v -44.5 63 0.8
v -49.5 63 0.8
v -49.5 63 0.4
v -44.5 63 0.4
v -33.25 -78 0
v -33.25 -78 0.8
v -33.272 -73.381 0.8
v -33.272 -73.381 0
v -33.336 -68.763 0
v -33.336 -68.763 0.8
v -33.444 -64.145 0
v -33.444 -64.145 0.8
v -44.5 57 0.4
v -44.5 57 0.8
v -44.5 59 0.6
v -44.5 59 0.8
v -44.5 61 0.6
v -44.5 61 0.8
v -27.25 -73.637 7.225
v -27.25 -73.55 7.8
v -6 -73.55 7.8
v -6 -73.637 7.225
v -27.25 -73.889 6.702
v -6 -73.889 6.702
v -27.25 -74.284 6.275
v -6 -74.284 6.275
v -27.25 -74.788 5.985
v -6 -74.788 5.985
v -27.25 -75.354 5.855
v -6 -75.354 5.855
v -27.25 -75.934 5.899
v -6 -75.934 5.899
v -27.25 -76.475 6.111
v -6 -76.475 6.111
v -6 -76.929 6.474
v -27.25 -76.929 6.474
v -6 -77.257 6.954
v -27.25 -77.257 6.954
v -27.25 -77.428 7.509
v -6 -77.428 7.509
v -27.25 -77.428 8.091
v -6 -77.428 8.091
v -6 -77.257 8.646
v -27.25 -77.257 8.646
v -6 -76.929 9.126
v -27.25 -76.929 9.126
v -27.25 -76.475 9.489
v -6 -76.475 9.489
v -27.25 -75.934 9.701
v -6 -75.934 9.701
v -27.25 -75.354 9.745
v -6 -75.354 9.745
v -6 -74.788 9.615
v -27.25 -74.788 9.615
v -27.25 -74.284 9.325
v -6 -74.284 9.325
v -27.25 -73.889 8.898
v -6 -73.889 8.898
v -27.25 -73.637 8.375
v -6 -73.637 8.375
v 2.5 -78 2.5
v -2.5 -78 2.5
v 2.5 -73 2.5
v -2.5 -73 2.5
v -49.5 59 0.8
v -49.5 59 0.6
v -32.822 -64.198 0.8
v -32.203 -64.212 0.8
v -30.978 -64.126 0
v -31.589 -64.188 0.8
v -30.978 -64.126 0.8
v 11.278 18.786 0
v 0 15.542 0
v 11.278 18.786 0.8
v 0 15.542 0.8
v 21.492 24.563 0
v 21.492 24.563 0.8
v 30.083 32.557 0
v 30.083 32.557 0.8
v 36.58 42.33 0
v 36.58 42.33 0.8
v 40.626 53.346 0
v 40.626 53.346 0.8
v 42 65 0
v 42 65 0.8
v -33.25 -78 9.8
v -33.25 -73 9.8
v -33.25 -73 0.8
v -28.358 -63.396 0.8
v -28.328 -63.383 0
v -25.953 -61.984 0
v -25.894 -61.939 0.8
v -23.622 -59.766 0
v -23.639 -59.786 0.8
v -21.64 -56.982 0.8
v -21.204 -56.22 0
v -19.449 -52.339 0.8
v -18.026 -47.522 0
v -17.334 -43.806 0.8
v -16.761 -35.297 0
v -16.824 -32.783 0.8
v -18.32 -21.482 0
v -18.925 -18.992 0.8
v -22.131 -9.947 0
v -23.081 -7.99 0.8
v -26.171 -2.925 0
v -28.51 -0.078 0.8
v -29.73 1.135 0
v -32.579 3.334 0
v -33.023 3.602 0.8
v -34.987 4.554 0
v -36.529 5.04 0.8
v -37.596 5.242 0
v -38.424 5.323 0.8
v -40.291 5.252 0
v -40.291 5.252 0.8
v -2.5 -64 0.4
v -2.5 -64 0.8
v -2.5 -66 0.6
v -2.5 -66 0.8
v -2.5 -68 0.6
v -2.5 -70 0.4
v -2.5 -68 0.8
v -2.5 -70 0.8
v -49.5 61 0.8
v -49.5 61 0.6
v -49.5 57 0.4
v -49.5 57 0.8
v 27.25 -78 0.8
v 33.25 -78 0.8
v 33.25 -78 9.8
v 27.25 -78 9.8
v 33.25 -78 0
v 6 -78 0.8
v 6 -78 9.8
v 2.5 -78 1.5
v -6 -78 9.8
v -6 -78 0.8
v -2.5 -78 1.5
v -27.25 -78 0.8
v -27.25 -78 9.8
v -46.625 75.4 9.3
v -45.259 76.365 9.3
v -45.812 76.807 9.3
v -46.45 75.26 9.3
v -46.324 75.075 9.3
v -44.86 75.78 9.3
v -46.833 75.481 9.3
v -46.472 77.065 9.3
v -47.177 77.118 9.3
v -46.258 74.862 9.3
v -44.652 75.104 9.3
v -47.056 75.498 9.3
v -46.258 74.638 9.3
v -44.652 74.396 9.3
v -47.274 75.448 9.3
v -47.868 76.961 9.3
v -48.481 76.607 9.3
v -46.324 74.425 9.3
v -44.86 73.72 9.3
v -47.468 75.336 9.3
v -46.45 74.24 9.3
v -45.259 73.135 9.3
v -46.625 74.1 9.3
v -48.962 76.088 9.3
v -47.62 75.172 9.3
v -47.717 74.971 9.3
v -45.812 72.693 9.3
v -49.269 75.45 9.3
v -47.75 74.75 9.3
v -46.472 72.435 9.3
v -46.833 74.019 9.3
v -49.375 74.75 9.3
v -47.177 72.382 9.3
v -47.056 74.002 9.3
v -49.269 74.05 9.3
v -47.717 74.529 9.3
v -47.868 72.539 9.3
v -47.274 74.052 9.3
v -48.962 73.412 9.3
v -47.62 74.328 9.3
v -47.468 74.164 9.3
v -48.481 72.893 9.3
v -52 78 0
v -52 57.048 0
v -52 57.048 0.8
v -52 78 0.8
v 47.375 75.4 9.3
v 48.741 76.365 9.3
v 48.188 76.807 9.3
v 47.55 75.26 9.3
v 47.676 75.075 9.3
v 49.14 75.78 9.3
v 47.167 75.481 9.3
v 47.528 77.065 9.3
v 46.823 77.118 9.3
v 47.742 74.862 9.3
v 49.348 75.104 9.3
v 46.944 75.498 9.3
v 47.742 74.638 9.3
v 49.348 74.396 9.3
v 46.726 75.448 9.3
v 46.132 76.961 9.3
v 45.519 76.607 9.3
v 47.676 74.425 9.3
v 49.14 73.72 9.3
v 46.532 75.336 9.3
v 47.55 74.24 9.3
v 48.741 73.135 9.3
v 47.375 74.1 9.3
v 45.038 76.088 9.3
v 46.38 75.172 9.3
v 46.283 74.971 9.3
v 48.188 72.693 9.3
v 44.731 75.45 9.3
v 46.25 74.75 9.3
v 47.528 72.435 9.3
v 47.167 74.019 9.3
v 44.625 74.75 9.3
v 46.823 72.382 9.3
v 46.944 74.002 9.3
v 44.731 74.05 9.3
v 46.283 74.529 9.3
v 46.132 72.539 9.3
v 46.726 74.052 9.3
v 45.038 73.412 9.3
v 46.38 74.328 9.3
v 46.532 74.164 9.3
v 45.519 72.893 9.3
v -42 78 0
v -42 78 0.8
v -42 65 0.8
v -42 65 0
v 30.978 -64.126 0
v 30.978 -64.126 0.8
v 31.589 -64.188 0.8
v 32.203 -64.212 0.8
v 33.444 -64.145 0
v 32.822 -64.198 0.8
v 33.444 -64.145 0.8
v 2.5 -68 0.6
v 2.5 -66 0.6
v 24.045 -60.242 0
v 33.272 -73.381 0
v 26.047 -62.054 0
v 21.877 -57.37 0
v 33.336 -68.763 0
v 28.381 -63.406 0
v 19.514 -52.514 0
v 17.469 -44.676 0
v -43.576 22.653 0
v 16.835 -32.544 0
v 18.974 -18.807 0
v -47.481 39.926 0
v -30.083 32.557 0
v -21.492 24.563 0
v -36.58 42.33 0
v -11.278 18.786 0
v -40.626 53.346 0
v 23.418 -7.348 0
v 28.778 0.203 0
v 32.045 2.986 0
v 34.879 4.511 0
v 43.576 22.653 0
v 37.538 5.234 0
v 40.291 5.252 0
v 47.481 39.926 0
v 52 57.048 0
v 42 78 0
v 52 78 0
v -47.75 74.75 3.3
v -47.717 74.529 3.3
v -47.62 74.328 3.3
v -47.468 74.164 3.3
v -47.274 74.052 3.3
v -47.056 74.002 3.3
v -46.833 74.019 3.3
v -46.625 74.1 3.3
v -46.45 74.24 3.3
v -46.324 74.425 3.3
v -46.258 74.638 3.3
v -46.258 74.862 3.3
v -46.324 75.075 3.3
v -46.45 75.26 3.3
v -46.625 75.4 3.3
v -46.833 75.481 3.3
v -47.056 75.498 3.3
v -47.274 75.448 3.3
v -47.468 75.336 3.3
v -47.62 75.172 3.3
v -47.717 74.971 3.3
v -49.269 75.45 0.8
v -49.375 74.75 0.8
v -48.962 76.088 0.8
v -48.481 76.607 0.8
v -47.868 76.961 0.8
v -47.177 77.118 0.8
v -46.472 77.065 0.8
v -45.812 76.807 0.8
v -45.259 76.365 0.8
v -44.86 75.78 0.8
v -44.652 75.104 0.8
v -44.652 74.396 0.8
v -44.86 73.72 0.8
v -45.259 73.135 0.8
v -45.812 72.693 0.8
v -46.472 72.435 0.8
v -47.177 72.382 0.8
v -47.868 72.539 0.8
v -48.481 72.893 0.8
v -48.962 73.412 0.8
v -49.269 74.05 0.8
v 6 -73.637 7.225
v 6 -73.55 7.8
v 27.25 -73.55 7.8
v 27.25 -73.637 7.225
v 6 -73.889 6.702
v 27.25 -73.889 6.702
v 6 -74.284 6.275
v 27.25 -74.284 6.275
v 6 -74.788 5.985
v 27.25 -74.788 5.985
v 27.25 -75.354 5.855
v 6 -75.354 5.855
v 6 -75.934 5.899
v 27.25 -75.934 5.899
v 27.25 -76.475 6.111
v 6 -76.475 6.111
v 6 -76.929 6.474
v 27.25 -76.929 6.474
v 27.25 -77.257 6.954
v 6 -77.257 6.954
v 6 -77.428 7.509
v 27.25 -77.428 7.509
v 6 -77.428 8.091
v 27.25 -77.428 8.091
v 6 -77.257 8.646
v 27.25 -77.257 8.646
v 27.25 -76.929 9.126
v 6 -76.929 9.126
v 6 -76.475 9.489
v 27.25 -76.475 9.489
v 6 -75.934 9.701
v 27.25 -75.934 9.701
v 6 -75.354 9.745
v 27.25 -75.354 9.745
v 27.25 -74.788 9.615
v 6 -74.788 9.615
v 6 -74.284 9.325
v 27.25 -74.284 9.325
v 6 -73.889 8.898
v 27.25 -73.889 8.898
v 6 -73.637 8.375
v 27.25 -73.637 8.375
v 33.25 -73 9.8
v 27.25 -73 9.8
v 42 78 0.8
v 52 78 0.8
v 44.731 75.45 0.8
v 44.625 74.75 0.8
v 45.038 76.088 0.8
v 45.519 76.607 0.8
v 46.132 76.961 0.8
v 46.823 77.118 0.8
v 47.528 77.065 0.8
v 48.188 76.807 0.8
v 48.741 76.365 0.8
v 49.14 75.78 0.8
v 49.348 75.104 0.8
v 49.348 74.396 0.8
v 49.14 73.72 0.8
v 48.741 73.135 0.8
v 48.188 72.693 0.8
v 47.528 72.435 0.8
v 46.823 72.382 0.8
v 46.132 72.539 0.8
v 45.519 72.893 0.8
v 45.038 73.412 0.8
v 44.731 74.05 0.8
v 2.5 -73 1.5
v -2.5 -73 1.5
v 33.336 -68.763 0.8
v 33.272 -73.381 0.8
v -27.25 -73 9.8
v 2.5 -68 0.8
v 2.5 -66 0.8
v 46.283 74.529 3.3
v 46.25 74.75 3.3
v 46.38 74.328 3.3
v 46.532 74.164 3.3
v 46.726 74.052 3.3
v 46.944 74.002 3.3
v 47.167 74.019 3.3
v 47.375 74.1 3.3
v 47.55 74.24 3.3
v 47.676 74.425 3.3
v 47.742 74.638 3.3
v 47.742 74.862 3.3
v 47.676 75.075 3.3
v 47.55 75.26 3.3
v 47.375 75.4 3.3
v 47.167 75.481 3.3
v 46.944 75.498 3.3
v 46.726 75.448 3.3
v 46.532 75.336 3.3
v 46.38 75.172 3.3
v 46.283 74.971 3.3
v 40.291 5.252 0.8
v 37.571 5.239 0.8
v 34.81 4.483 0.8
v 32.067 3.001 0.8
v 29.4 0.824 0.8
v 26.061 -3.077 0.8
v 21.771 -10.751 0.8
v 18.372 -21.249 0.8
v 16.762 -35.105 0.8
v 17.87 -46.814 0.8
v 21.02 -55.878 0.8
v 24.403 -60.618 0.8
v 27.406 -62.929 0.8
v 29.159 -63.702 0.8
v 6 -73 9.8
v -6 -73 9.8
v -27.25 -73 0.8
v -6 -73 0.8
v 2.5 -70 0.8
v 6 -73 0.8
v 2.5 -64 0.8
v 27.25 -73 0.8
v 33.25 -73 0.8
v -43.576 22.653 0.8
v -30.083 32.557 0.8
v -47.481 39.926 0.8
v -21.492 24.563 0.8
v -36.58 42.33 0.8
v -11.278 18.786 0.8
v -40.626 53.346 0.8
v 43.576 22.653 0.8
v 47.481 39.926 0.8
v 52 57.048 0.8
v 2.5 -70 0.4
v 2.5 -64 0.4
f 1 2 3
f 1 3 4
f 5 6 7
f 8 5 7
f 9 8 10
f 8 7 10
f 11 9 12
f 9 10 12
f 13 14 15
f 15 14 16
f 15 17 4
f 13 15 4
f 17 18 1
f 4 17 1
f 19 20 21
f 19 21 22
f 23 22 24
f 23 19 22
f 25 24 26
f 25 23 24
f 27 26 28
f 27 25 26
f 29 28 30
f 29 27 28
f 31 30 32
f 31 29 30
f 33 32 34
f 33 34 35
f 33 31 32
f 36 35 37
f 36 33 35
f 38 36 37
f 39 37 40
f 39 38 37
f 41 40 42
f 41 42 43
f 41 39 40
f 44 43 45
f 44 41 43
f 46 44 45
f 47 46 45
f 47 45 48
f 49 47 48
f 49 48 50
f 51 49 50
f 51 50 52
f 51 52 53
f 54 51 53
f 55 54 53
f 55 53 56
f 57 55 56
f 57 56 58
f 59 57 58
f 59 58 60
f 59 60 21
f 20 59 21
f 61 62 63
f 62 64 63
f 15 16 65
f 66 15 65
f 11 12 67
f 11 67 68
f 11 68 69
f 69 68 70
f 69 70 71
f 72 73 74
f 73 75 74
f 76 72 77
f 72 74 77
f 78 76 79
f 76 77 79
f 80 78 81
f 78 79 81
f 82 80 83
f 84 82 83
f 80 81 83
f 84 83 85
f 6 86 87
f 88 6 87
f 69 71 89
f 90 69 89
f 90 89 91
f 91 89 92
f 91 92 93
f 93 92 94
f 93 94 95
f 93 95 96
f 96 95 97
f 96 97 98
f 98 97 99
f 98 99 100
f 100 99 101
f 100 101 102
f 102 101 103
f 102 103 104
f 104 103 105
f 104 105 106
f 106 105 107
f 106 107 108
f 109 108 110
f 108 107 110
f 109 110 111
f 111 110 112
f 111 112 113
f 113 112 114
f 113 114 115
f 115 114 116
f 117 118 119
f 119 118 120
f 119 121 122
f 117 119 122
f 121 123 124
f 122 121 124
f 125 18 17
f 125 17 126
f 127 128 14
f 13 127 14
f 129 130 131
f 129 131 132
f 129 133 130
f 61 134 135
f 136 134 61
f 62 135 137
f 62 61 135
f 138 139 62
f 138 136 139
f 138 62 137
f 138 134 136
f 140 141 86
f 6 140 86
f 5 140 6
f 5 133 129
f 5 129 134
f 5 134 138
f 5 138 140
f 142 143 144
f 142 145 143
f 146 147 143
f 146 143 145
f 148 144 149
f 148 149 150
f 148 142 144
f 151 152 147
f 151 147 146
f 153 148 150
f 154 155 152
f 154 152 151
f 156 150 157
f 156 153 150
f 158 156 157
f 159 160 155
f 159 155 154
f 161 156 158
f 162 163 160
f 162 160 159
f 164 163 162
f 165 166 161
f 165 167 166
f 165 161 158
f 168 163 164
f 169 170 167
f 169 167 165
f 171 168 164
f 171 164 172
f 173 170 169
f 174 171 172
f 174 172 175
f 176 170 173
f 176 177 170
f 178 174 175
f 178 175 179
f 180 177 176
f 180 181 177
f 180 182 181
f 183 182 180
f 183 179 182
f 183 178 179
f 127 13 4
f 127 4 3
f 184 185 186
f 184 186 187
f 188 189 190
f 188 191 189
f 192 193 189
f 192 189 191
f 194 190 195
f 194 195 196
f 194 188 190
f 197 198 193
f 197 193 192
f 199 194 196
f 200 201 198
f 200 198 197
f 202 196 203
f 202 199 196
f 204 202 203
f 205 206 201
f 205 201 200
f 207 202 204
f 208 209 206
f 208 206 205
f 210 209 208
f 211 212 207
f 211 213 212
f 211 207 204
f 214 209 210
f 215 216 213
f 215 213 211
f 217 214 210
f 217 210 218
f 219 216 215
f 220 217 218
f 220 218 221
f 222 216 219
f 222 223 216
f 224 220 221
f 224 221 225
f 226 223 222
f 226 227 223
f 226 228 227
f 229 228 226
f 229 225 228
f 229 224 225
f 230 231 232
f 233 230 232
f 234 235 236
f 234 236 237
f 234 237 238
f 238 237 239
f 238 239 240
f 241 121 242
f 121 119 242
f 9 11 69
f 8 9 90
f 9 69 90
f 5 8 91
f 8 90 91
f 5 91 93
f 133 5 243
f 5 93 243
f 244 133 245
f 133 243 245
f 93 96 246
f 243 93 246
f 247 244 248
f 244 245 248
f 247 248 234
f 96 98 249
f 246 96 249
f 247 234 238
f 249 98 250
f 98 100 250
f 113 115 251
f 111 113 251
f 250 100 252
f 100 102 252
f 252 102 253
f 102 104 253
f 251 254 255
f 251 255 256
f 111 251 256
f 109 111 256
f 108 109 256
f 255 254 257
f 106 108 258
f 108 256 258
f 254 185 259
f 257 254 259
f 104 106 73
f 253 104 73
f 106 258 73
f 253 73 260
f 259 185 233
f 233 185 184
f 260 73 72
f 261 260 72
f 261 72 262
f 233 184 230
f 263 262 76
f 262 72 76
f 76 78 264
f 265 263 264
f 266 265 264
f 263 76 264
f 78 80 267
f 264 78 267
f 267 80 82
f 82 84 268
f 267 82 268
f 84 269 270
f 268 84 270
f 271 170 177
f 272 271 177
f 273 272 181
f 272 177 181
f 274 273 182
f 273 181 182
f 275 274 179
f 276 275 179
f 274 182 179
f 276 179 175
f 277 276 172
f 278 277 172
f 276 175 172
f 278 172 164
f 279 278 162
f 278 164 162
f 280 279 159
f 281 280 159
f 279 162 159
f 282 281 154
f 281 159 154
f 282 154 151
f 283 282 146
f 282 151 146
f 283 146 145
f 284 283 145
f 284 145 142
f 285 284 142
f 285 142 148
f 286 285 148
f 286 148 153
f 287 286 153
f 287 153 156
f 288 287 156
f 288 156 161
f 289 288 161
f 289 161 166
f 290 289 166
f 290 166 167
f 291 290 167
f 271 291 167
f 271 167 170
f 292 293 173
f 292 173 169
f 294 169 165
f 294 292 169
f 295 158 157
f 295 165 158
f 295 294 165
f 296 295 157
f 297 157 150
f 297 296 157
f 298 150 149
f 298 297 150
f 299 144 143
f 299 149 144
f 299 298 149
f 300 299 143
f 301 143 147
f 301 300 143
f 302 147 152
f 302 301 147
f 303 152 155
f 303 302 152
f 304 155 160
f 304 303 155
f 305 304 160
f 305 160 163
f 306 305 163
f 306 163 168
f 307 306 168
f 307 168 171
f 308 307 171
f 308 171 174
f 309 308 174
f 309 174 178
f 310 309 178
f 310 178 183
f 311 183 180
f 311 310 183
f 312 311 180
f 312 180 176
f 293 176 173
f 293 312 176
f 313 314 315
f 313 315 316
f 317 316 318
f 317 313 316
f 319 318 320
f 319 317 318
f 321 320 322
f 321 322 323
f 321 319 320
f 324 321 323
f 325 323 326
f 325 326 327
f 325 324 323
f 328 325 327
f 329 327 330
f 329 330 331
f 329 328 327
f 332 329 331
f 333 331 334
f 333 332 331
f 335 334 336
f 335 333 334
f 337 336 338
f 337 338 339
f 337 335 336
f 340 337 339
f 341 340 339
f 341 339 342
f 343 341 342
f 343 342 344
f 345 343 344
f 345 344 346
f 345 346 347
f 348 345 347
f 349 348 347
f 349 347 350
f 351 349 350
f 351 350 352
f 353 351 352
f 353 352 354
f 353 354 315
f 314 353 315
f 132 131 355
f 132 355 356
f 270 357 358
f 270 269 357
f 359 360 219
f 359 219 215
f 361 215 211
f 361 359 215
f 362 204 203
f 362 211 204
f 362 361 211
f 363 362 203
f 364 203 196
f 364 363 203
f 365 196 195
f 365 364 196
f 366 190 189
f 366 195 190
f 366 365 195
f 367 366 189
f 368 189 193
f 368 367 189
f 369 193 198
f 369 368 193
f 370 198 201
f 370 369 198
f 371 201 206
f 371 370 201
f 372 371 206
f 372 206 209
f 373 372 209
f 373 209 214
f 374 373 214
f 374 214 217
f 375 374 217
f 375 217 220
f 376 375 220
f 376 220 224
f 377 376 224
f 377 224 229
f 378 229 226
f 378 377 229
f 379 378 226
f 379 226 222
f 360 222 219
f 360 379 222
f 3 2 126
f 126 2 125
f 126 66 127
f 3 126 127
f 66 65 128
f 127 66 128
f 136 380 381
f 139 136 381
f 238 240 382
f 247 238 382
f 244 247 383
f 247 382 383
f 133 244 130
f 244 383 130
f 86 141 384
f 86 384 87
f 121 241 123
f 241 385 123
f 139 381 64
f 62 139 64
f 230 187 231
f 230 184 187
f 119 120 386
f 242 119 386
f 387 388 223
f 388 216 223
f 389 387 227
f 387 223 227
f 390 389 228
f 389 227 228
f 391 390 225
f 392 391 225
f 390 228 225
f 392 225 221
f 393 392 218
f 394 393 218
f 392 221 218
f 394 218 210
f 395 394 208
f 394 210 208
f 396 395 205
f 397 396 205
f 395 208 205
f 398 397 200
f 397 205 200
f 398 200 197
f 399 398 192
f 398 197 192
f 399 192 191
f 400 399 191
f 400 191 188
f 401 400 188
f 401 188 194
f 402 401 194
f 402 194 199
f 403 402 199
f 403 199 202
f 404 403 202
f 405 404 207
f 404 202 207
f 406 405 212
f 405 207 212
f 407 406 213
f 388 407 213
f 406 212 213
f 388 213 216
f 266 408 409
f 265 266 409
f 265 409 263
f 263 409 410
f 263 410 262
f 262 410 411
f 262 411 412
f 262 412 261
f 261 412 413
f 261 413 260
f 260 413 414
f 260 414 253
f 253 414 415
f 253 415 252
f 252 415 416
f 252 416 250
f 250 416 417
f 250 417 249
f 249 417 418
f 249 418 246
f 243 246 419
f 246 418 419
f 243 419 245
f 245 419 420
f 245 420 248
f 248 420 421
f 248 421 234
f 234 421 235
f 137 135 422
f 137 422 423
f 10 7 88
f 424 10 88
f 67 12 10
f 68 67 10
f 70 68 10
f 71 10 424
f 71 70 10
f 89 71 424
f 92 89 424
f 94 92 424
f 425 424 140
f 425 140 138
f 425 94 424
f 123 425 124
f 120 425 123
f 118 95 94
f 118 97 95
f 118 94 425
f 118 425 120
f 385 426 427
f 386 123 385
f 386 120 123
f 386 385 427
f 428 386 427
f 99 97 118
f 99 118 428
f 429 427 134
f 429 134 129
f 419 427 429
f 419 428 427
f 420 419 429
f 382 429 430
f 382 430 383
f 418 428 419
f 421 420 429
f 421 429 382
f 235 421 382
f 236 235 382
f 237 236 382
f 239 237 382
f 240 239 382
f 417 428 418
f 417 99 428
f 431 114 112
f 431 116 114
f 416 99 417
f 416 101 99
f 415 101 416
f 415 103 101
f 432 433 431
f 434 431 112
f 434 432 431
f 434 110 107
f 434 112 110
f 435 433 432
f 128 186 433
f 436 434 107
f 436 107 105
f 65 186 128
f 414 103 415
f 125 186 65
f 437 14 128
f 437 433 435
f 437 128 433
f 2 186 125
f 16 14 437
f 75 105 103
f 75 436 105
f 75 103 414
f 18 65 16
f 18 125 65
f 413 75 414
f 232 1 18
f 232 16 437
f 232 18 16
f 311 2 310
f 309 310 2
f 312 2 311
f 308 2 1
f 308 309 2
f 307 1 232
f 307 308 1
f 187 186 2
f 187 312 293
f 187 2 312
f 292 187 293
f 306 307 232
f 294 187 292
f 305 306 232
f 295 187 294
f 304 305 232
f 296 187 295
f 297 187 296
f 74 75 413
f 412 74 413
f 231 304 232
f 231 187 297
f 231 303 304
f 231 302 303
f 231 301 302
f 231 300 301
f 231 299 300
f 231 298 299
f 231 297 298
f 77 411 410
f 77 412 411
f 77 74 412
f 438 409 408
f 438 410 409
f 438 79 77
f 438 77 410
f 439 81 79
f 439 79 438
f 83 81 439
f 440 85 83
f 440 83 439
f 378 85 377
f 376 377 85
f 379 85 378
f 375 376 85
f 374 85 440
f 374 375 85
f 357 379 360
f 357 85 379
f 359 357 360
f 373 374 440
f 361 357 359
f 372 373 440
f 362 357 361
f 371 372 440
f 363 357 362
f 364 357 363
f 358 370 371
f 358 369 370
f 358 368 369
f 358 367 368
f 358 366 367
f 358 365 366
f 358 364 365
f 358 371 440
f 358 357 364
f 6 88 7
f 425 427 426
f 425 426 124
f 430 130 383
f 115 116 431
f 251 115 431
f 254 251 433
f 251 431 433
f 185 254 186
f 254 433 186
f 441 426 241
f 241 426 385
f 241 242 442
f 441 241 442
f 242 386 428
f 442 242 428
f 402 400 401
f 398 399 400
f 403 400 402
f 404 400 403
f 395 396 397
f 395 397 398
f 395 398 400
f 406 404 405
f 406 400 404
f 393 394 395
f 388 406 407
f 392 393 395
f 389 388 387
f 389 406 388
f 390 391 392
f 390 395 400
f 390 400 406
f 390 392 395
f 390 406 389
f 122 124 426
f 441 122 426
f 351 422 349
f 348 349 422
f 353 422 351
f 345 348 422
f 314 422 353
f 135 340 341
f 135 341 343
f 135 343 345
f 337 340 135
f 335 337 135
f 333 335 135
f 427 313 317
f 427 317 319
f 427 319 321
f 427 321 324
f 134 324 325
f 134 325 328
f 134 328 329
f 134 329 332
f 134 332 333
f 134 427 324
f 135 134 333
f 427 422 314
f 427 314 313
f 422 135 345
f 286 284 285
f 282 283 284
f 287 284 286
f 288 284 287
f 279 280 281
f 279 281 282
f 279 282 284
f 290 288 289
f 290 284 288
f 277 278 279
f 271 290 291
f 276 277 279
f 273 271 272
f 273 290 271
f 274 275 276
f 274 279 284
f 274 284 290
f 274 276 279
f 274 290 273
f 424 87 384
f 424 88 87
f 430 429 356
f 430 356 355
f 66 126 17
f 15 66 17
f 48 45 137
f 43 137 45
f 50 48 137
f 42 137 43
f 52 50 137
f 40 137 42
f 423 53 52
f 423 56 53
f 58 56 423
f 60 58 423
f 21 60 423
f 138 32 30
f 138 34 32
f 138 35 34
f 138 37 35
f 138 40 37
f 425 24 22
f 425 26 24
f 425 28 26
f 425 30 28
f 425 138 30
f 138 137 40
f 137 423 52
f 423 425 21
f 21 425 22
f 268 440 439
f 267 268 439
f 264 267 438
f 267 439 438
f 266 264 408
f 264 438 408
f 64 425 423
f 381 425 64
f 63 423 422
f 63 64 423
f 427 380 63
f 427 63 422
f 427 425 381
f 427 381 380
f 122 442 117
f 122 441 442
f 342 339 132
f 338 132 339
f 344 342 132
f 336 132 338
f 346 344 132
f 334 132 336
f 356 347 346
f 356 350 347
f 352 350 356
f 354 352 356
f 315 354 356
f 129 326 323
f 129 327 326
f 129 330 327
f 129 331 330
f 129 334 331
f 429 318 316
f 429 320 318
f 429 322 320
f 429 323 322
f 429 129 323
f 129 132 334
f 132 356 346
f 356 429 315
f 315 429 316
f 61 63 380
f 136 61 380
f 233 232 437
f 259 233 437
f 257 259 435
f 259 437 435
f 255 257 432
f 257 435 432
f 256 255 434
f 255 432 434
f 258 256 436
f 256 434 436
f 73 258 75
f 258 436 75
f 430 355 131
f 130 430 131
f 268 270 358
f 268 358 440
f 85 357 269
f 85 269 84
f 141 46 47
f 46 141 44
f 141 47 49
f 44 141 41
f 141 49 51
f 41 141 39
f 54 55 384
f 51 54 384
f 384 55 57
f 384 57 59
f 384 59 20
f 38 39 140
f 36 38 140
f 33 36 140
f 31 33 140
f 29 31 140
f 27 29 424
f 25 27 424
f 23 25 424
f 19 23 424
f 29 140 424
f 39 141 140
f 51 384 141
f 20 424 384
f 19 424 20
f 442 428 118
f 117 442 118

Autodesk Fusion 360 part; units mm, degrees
sketch "Esboço1" plane through (0, 0, 0) normal (0, 0, 1) x (1, 0, 0)
  line L0 (-52, 78) -> (52, 78)
  line L1 (52, 78) -> (52, -78)
  line L2 (52, -78) -> (-52, -78)
  line L3 (-52, -78) -> (-52, 78)
  dimension "d1" = 104
  dimension "d2" = 156
  dimension "d3" = 52
  dimension "d4" = 78
extrude "Extrusão1" add sketch "Esboço1" along normal blind 0.8
sketch "Esboço2" plane through (0, 0, 0.8) normal (0, 0, 1) x (-1, 0, 0)
  line L0 (52, 78) -> (-52, 78)
  line L1 (-52, 78) -> (-52, -78)
  line L2 (-52, -78) -> (52, -78)
  line L3 (52, -78) -> (52, 78)
  line L4 (-52, -78) -> (-42, -78)
  line L5 (-42, -78) -> (-42, -65)
  line L6 (-42, -65) -> (-52, -65)
  line L7 (-52, -65) -> (-52, -78)
  line L8 (0, -1.75) -> (0, -22.5)
  line L9 (42, -65) -> (52, -65)
  line L10 (42, -78) -> (42, -65)
  line L11 (52, -65) -> (52, -78)
  line L12 (52, -78) -> (42, -78)
  line L13 (42, -65) -> (-42, -65)
  line L14 (-42, -65) -> (-42, -78)
  line L15 (-42, -78) -> (42, -78)
  line L16 (42, -78) -> (42, -65)
  point P0 (52, -78)
  dimension "d7" = 10
  dimension "d8" = 13
extrude "Extrusão2" cut sketch "Esboço2" against normal blind 2 contours L2 L5 L10 L13 L14 L15 L16
sketch "Esboço3" plane through (0, 0, 0.8) normal (0, 0, 1) x (-1, 0, 0)
  line L0 (42, -65) -> (42, -78)
  line L1 (42, -78) -> (52, -78)
  line L2 (52, -78) -> (52, 78)
  line L3 (52, 78) -> (-52, 78)
  line L4 (-52, 78) -> (-52, -78)
  line L5 (-52, -78) -> (-42, -78)
  line L6 (-42, -78) -> (-42, -65)
  line L7 (-42, -65) -> (42, -65)
  line L8 (-33.25, 78) -> (33.25, 78)
  line L9 (33.25, 78) -> (33.25, 75)
  line L10 (33.25, 75) -> (-33.25, 75)
  line L11 (-33.25, 75) -> (-33.25, 78)
  arc A0 (33.25, 78) -> (52, -57.0483) centre (528.9728, 78) ccw
  line L12 (52, -57.0483) -> (52, 78)
  line L13 (0, -1.75) -> (0, -22.5)
  arc A1 (-52, -57.0483) -> (-33.25, 78) centre (-528.9728, 78) ccw
  line L14 (-33.25, 78) -> (-33.25, 75)
  line L15 (-52, -57.0483) -> (-52, 78)
  arc A2 (42, -65) -> (-0.2595, -15.5) centre (-8.1203, -65) ccw
  arc A3 (0.2595, -15.5) -> (-42, -65) centre (8.1203, -65) ccw
  point P0 (-52, 78)
  point P1 (-42, -65)
  point P2 (-0.2595, -15.5)
  dimension "d11" = 66.5
  dimension "d12" = 3
  dimension "d13" = 18.75
  dimension "d14" = 62.5
extrude "Extrusão3" cut sketch "Esboço3" against normal blind 2 contours L7 A2 A3 | L2 L3 A0 L12 | L3 L4 A1 L15
sketch "Esboço4" plane through (0, 0, 0.8) normal (0, 0, 1) x (-1, 0, 0)
  arc A0 (0, -15.5419) -> (-42, -65) centre (8.1203, -65) ccw
  arc A1 (42, -65) -> (0, -15.5419) centre (-8.1203, -65) ccw
  line L0 (42, -65) -> (42, -78)
  line L1 (42, -78) -> (52, -78)
  line L2 (52, -78) -> (52, -57.0483)
  arc A2 (33.25, 78) -> (52, -57.0483) centre (528.9728, 78) ccw
  line L3 (33.25, 78) -> (-33.25, 78)
  arc A3 (-52, -57.0483) -> (-33.25, 78) centre (-528.9728, 78) ccw
  line L4 (-52, -57.0483) -> (-52, -78)
  line L5 (-52, -78) -> (-42, -78)
  line L6 (-42, -78) -> (-42, -65)
  line L7 (-33.25, 78) -> (33.25, 78)
  line L8 (33.25, 78) -> (33.25, 73)
  line L9 (33.25, 73) -> (-33.25, 73)
  line L10 (-33.25, 73) -> (-33.25, 78)
  line L11 (-33.25, 78) -> (-27.25, 78)
  line L12 (-27.25, 78) -> (-27.25, 69)
  line L13 (-27.25, 69) -> (-33.25, 69)
  line L14 (-33.25, 69) -> (-33.25, 78)
  line L15 (33.25, 78) -> (27.25, 78)
  line L16 (27.25, 78) -> (27.25, 69)
  line L17 (27.25, 69) -> (33.25, 69)
  line L18 (33.25, 69) -> (33.25, 78)
  line L19 (-6, 78) -> (6, 78)
  line L20 (6, 78) -> (6, 69)
  line L21 (6, 69) -> (-6, 69)
  line L22 (-6, 69) -> (-6, 78)
  dimension "d17" = 66.5
  dimension "d18" = 5
  dimension "d19" = 6
  dimension "d20" = 6
  dimension "d21" = 12
  dimension "d22" = 6
extrude "Extrusão4" add sketch "Esboço4" along normal blind 9 contours L3 L7 L9 L10 L11 L12 L14 | L3 L7 L8 L9 L15 L16 L18 | L3 L7 L9 L19 L20 L22
sketch "Esboço5" plane through (-27.25, 0, 0) normal (1, 0, 0) x (0, 1, 0)
  line L0 (-78, 0.8) -> (-73, 0.8)
  line L1 (-73, 0.8) -> (-73, 9.8)
  line L2 (-73, 9.8) -> (-78, 9.8)
  circle A0 centre (-75.5, 7.8) radius 1.95
  line L3 (-78, 9.8) -> (-78, 0.8)
  point P0 (-75.5, 7.8)
  dimension "d25" = 2
  dimension "d27" = 3.9
  dimension "d43" = 2.5
extrude "Extrusão5" add sketch "Esboço5" along normal blind 60.5 contours A0
sketch "Esboço6" plane through (0, 0, 0.8) normal (0, 0, 1) x (-1, 0, 0)
  line L0 (-27.25, 78) -> (-27.25, 73)
  line L1 (-27.25, 73) -> (-33.25, 73)
  line L2 (-33.25, 73) -> (-33.25, 78)
  arc A0 (-52, -57.0483) -> (-33.25, 78) centre (-528.9728, 78) ccw
  line L3 (-52, -57.0483) -> (-52, -78)
  line L4 (-52, -78) -> (-42, -78)
  line L5 (-42, -78) -> (-42, -65)
  arc A1 (0, -15.5419) -> (-42, -65) centre (8.1203, -65) ccw
  arc A2 (42, -65) -> (0, -15.5419) centre (-8.1203, -65) ccw
  line L6 (42, -65) -> (42, -78)
  line L7 (42, -78) -> (52, -78)
  line L8 (52, -78) -> (52, -57.0483)
  arc A3 (33.25, 78) -> (52, -57.0483) centre (528.9728, 78) ccw
  line L9 (33.25, 78) -> (33.25, 73)
  line L10 (33.25, 73) -> (27.25, 73)
  line L11 (27.25, 73) -> (27.25, 78)
  line L12 (27.25, 78) -> (6, 78)
  line L13 (6, 78) -> (6, 73)
  line L14 (6, 73) -> (-6, 73)
  line L15 (-6, 73) -> (-6, 78)
  line L16 (-6, 78) -> (-27.25, 78)
  circle A4 centre (-47, -74.75) radius 2.375
  line L17 (0, -1.75) -> (0, -22.5)
  circle A5 centre (47, -74.75) radius 2.375
  point P0 (-47, -74.75)
  point P1 (47, -74.75)
  point P2 (52, -57.0483)
  point P3 (52, -78)
  point P4 (42, -78)
  point P5 (42, -65)
  dimension "d30" = 5
  dimension "d31" = 3.25
  dimension "d32" = 4.75
extrude "Extrusão6" add sketch "Esboço6" along normal blind 8.5 contours A4 | A5
sketch "Esboço7" plane through (0, 0, 9.3) normal (0, 0, 1) x (-1, 0, 0)
  circle A0 centre (-47, -74.75) radius 2.375
  circle A1 centre (-47, -74.75) radius 0.75
  line L0 (0, -1.75) -> (0, -22.5)
  circle A2 centre (47, -74.75) radius 0.75
  point P0 (47, -74.75)
  dimension "d36" = 1.5
  dimension "d37" = 1.625
extrude "Extrusão7" cut sketch "Esboço7" against normal blind 6 contours A1 | A2
sketch "Esboço8" plane through (0, 0, 0.8) normal (0, 0, 1) x (-1, 0, 0)
  circle A0 centre (47, -74.75) radius 2.375
  circle A1 centre (-47, -74.75) radius 2.375
  line L0 (-27.25, 78) -> (-27.25, 73)
  line L1 (-27.25, 73) -> (-33.25, 73)
  line L2 (-33.25, 73) -> (-33.25, 78)
  arc A2 (-52, -57.0483) -> (-33.25, 78) centre (-528.9728, 78) ccw
  line L3 (-52, -57.0483) -> (-52, -78)
  line L4 (-52, -78) -> (-42, -78)
  line L5 (-42, -78) -> (-42, -65)
  arc A3 (0, -15.5419) -> (-42, -65) centre (8.1203, -65) ccw
  arc A4 (42, -65) -> (0, -15.5419) centre (-8.1203, -65) ccw
  line L6 (42, -65) -> (42, -78)
  line L7 (42, -78) -> (52, -78)
  line L8 (52, -78) -> (52, -57.0483)
  arc A5 (33.25, 78) -> (52, -57.0483) centre (528.9728, 78) ccw
  line L9 (33.25, 78) -> (33.25, 73)
  line L10 (33.25, 73) -> (27.25, 73)
  line L11 (27.25, 73) -> (27.25, 78)
  line L12 (27.25, 78) -> (6, 78)
  line L13 (6, 78) -> (6, 73)
  line L14 (6, 73) -> (-6, 73)
  line L15 (-6, 73) -> (-6, 78)
  line L16 (-6, 78) -> (-27.25, 78)
  ellipse E0 centre (35.6344, 29.437) end of major axis (30.9782, 64.1259) minor radius 18.4551
  line L17 (40.2907, -5.2519) -> (30.9782, 64.1259) construction
  line L18 (53.9255, 31.8922) -> (17.3434, 26.9818) construction
  line L19 (0, -1.75) -> (0, -22.5)
  ellipse E1 centre (-35.6344, 29.437) end of major axis (-30.9782, 64.1259) minor radius 18.4551
  dimension "d42" = 70
extrude "Extrusão8" cut sketch "Esboço8" against normal blind 10 contours A2 E1 | A5 E0 picked at (-29.7614, 27.7315) picked at (29.5401, 29.38)
sketch "Esboço9" plane through (0, 0, 0.8) normal (0, 0, 1) x (-1, 0, 0)
  ellipse E0 centre (35.6344, 29.437) end of major axis (30.9782, 64.1259) minor radius 18.4551 (33.4436, 64.1453) -> (40.2907, -5.2519) ccw
  arc A0 (33.25, 78) -> (33.4436, 64.1453) centre (528.9728, 78) ccw
  line L0 (33.25, 78) -> (33.25, 73)
  line L1 (33.25, 73) -> (27.25, 73)
  line L2 (27.25, 73) -> (27.25, 78)
  line L3 (27.25, 78) -> (6, 78)
  line L4 (6, 78) -> (6, 73)
  line L5 (6, 73) -> (-6, 73)
  line L6 (-6, 73) -> (-6, 78)
  line L7 (-6, 78) -> (-27.25, 78)
  line L8 (-27.25, 78) -> (-27.25, 73)
  line L9 (-27.25, 73) -> (-33.25, 73)
  line L10 (-33.25, 73) -> (-33.25, 78)
  arc A1 (-33.4436, 64.1453) -> (-33.25, 78) centre (-528.9728, 78) ccw
  ellipse E1 centre (-35.6344, 29.437) end of major axis (-30.9782, 64.1259) minor radius 18.4551 (-40.2907, -5.2519) -> (-33.4436, 64.1453) ccw
  arc A2 (-52, -57.0483) -> (-40.2907, -5.2519) centre (-528.9728, 78) ccw
  line L11 (-52, -57.0483) -> (-52, -78)
  line L12 (-52, -78) -> (-42, -78)
  line L13 (-42, -78) -> (-42, -65)
  arc A3 (0, -15.5419) -> (-42, -65) centre (8.1203, -65) ccw
  arc A4 (42, -65) -> (0, -15.5419) centre (-8.1203, -65) ccw
  line L14 (42, -65) -> (42, -78)
  line L15 (42, -78) -> (52, -78)
  line L16 (52, -78) -> (52, -57.0483)
  arc A5 (40.2907, -5.2519) -> (52, -57.0483) centre (528.9728, 78) ccw
  circle A6 centre (-47, -74.75) radius 2.375
  circle A7 centre (47, -74.75) radius 2.375
  line L17 (49.5, -63) -> (44.5, -63)
  line L18 (44.5, -63) -> (44.5, -61)
  line L19 (44.5, -61) -> (49.5, -61)
  line L20 (49.5, -61) -> (49.5, -63)
  line L21 (44.5, -59) -> (49.5, -59)
  line L22 (49.5, -59) -> (49.5, -57)
  line L23 (49.5, -57) -> (44.5, -57)
  line L24 (44.5, -57) -> (44.5, -59)
  line L25 (2.5, 70) -> (-2.5, 70)
  line L26 (-2.5, 70) -> (-2.5, 68)
  line L27 (-2.5, 68) -> (2.5, 68)
  line L28 (2.5, 68) -> (2.5, 70)
  line L29 (2.5, 66) -> (-2.5, 66)
  line L30 (-2.5, 66) -> (-2.5, 64)
  line L31 (-2.5, 64) -> (2.5, 64)
  line L32 (2.5, 64) -> (2.5, 66)
  dimension "d44" = 5
  dimension "d45" = 2
  dimension "d46" = 2.5
  dimension "d47" = 2.5
  dimension "d48" = 15
  dimension "d49" = 2.5
  dimension "d50" = 2
  dimension "d51" = 2
  dimension "d52" = 5
  dimension "d53" = 5
  dimension "d54" = 2
  dimension "d55" = 12
  dimension "d56" = 3.5
  dimension "d57" = 3
  dimension "d58" = 5
  dimension "d59" = 2
  dimension "d60" = 2
extrude "Extrusão9" cut sketch "Esboço9" against normal blind 0.4 contours L17 L18 L19 L20 | L21 L22 L23 L24 | L25 L26 L27 L28 | L29 L30 L31 L32
sketch "Esboço10" plane through (0, 61, 0) normal (0, 1, 0) x (-1, 0, 0)
  line L0 (49.5, 0.8) -> (44.5, 0.8)
  line L1 (44.5, 0.8) -> (44.5, 0.4)
  line L2 (44.5, 0.4) -> (49.5, 0.4)
  line L3 (49.5, 0.4) -> (49.5, 0.8)
  line L4 (44.5, 0.4) -> (49.5, 0.4)
  line L5 (49.5, 0.4) -> (49.5, 0.6)
  line L6 (49.5, 0.6) -> (44.5, 0.6)
  line L7 (44.5, 0.6) -> (44.5, 0.4)
  dimension "d63" = 5
extrude "Extrusão10" cut sketch "Esboço10" against normal blind 2 contours L1 L2 L3 L4 L5 L6 L7
sketch "Esboço11" plane through (0, -73, 0) normal (0, 1, 0) x (-1, 0, 0)
  line L0 (-6, 0.8) -> (6, 0.8)
  line L1 (6, 0.8) -> (6, 9.8)
  line L2 (6, 9.8) -> (-6, 9.8)
  line L3 (-6, 9.8) -> (-6, 0.8)
  line L4 (-2.5, 1.5) -> (2.5, 1.5)
  line L5 (2.5, 1.5) -> (2.5, 2.5)
  line L6 (2.5, 2.5) -> (-2.5, 2.5)
  line L7 (-2.5, 2.5) -> (-2.5, 1.5)
  dimension "d66" = 1
  dimension "d67" = 5
  dimension "d68" = 3.5
extrude "Extrusão11" cut sketch "Esboço11" against normal blind 20 contours L4 L5 L6 L7
sketch "Esboço12" plane through (0, -66, 0) normal (0, 1, 0) x (-1, 0, 0)
  line L0 (2.5, 0.8) -> (-2.5, 0.8)
  line L1 (-2.5, 0.8) -> (-2.5, 0.4)
  line L2 (-2.5, 0.4) -> (2.5, 0.4)
  line L3 (2.5, 0.4) -> (2.5, 0.8)
  line L4 (-2.5, 0.4) -> (2.5, 0.4)
  line L5 (2.5, 0.4) -> (2.5, 0.6)
  line L6 (2.5, 0.6) -> (-2.5, 0.6)
  line L7 (-2.5, 0.6) -> (-2.5, 0.4)
  dimension "d71" = 5
extrude "Extrusão12" cut sketch "Esboço12" against normal blind 2 contours L1 L2 L3 L4 L5 L6 L7
equation "d2 = 148 mm + 8 mm"
equation "d3 = ( 104 / 2 ) * 1 mm"
equation "d4 = ( ( 148 + 8 ) / 2 ) * 1 mm"
equation "d13 = ( ( 104 - 66.5 ) / 2 ) * 1 mm"
equation "d22 = ( 12 / 2 ) * 1 mm"
equation "d28 = 66.5 mm - 6 mm"
